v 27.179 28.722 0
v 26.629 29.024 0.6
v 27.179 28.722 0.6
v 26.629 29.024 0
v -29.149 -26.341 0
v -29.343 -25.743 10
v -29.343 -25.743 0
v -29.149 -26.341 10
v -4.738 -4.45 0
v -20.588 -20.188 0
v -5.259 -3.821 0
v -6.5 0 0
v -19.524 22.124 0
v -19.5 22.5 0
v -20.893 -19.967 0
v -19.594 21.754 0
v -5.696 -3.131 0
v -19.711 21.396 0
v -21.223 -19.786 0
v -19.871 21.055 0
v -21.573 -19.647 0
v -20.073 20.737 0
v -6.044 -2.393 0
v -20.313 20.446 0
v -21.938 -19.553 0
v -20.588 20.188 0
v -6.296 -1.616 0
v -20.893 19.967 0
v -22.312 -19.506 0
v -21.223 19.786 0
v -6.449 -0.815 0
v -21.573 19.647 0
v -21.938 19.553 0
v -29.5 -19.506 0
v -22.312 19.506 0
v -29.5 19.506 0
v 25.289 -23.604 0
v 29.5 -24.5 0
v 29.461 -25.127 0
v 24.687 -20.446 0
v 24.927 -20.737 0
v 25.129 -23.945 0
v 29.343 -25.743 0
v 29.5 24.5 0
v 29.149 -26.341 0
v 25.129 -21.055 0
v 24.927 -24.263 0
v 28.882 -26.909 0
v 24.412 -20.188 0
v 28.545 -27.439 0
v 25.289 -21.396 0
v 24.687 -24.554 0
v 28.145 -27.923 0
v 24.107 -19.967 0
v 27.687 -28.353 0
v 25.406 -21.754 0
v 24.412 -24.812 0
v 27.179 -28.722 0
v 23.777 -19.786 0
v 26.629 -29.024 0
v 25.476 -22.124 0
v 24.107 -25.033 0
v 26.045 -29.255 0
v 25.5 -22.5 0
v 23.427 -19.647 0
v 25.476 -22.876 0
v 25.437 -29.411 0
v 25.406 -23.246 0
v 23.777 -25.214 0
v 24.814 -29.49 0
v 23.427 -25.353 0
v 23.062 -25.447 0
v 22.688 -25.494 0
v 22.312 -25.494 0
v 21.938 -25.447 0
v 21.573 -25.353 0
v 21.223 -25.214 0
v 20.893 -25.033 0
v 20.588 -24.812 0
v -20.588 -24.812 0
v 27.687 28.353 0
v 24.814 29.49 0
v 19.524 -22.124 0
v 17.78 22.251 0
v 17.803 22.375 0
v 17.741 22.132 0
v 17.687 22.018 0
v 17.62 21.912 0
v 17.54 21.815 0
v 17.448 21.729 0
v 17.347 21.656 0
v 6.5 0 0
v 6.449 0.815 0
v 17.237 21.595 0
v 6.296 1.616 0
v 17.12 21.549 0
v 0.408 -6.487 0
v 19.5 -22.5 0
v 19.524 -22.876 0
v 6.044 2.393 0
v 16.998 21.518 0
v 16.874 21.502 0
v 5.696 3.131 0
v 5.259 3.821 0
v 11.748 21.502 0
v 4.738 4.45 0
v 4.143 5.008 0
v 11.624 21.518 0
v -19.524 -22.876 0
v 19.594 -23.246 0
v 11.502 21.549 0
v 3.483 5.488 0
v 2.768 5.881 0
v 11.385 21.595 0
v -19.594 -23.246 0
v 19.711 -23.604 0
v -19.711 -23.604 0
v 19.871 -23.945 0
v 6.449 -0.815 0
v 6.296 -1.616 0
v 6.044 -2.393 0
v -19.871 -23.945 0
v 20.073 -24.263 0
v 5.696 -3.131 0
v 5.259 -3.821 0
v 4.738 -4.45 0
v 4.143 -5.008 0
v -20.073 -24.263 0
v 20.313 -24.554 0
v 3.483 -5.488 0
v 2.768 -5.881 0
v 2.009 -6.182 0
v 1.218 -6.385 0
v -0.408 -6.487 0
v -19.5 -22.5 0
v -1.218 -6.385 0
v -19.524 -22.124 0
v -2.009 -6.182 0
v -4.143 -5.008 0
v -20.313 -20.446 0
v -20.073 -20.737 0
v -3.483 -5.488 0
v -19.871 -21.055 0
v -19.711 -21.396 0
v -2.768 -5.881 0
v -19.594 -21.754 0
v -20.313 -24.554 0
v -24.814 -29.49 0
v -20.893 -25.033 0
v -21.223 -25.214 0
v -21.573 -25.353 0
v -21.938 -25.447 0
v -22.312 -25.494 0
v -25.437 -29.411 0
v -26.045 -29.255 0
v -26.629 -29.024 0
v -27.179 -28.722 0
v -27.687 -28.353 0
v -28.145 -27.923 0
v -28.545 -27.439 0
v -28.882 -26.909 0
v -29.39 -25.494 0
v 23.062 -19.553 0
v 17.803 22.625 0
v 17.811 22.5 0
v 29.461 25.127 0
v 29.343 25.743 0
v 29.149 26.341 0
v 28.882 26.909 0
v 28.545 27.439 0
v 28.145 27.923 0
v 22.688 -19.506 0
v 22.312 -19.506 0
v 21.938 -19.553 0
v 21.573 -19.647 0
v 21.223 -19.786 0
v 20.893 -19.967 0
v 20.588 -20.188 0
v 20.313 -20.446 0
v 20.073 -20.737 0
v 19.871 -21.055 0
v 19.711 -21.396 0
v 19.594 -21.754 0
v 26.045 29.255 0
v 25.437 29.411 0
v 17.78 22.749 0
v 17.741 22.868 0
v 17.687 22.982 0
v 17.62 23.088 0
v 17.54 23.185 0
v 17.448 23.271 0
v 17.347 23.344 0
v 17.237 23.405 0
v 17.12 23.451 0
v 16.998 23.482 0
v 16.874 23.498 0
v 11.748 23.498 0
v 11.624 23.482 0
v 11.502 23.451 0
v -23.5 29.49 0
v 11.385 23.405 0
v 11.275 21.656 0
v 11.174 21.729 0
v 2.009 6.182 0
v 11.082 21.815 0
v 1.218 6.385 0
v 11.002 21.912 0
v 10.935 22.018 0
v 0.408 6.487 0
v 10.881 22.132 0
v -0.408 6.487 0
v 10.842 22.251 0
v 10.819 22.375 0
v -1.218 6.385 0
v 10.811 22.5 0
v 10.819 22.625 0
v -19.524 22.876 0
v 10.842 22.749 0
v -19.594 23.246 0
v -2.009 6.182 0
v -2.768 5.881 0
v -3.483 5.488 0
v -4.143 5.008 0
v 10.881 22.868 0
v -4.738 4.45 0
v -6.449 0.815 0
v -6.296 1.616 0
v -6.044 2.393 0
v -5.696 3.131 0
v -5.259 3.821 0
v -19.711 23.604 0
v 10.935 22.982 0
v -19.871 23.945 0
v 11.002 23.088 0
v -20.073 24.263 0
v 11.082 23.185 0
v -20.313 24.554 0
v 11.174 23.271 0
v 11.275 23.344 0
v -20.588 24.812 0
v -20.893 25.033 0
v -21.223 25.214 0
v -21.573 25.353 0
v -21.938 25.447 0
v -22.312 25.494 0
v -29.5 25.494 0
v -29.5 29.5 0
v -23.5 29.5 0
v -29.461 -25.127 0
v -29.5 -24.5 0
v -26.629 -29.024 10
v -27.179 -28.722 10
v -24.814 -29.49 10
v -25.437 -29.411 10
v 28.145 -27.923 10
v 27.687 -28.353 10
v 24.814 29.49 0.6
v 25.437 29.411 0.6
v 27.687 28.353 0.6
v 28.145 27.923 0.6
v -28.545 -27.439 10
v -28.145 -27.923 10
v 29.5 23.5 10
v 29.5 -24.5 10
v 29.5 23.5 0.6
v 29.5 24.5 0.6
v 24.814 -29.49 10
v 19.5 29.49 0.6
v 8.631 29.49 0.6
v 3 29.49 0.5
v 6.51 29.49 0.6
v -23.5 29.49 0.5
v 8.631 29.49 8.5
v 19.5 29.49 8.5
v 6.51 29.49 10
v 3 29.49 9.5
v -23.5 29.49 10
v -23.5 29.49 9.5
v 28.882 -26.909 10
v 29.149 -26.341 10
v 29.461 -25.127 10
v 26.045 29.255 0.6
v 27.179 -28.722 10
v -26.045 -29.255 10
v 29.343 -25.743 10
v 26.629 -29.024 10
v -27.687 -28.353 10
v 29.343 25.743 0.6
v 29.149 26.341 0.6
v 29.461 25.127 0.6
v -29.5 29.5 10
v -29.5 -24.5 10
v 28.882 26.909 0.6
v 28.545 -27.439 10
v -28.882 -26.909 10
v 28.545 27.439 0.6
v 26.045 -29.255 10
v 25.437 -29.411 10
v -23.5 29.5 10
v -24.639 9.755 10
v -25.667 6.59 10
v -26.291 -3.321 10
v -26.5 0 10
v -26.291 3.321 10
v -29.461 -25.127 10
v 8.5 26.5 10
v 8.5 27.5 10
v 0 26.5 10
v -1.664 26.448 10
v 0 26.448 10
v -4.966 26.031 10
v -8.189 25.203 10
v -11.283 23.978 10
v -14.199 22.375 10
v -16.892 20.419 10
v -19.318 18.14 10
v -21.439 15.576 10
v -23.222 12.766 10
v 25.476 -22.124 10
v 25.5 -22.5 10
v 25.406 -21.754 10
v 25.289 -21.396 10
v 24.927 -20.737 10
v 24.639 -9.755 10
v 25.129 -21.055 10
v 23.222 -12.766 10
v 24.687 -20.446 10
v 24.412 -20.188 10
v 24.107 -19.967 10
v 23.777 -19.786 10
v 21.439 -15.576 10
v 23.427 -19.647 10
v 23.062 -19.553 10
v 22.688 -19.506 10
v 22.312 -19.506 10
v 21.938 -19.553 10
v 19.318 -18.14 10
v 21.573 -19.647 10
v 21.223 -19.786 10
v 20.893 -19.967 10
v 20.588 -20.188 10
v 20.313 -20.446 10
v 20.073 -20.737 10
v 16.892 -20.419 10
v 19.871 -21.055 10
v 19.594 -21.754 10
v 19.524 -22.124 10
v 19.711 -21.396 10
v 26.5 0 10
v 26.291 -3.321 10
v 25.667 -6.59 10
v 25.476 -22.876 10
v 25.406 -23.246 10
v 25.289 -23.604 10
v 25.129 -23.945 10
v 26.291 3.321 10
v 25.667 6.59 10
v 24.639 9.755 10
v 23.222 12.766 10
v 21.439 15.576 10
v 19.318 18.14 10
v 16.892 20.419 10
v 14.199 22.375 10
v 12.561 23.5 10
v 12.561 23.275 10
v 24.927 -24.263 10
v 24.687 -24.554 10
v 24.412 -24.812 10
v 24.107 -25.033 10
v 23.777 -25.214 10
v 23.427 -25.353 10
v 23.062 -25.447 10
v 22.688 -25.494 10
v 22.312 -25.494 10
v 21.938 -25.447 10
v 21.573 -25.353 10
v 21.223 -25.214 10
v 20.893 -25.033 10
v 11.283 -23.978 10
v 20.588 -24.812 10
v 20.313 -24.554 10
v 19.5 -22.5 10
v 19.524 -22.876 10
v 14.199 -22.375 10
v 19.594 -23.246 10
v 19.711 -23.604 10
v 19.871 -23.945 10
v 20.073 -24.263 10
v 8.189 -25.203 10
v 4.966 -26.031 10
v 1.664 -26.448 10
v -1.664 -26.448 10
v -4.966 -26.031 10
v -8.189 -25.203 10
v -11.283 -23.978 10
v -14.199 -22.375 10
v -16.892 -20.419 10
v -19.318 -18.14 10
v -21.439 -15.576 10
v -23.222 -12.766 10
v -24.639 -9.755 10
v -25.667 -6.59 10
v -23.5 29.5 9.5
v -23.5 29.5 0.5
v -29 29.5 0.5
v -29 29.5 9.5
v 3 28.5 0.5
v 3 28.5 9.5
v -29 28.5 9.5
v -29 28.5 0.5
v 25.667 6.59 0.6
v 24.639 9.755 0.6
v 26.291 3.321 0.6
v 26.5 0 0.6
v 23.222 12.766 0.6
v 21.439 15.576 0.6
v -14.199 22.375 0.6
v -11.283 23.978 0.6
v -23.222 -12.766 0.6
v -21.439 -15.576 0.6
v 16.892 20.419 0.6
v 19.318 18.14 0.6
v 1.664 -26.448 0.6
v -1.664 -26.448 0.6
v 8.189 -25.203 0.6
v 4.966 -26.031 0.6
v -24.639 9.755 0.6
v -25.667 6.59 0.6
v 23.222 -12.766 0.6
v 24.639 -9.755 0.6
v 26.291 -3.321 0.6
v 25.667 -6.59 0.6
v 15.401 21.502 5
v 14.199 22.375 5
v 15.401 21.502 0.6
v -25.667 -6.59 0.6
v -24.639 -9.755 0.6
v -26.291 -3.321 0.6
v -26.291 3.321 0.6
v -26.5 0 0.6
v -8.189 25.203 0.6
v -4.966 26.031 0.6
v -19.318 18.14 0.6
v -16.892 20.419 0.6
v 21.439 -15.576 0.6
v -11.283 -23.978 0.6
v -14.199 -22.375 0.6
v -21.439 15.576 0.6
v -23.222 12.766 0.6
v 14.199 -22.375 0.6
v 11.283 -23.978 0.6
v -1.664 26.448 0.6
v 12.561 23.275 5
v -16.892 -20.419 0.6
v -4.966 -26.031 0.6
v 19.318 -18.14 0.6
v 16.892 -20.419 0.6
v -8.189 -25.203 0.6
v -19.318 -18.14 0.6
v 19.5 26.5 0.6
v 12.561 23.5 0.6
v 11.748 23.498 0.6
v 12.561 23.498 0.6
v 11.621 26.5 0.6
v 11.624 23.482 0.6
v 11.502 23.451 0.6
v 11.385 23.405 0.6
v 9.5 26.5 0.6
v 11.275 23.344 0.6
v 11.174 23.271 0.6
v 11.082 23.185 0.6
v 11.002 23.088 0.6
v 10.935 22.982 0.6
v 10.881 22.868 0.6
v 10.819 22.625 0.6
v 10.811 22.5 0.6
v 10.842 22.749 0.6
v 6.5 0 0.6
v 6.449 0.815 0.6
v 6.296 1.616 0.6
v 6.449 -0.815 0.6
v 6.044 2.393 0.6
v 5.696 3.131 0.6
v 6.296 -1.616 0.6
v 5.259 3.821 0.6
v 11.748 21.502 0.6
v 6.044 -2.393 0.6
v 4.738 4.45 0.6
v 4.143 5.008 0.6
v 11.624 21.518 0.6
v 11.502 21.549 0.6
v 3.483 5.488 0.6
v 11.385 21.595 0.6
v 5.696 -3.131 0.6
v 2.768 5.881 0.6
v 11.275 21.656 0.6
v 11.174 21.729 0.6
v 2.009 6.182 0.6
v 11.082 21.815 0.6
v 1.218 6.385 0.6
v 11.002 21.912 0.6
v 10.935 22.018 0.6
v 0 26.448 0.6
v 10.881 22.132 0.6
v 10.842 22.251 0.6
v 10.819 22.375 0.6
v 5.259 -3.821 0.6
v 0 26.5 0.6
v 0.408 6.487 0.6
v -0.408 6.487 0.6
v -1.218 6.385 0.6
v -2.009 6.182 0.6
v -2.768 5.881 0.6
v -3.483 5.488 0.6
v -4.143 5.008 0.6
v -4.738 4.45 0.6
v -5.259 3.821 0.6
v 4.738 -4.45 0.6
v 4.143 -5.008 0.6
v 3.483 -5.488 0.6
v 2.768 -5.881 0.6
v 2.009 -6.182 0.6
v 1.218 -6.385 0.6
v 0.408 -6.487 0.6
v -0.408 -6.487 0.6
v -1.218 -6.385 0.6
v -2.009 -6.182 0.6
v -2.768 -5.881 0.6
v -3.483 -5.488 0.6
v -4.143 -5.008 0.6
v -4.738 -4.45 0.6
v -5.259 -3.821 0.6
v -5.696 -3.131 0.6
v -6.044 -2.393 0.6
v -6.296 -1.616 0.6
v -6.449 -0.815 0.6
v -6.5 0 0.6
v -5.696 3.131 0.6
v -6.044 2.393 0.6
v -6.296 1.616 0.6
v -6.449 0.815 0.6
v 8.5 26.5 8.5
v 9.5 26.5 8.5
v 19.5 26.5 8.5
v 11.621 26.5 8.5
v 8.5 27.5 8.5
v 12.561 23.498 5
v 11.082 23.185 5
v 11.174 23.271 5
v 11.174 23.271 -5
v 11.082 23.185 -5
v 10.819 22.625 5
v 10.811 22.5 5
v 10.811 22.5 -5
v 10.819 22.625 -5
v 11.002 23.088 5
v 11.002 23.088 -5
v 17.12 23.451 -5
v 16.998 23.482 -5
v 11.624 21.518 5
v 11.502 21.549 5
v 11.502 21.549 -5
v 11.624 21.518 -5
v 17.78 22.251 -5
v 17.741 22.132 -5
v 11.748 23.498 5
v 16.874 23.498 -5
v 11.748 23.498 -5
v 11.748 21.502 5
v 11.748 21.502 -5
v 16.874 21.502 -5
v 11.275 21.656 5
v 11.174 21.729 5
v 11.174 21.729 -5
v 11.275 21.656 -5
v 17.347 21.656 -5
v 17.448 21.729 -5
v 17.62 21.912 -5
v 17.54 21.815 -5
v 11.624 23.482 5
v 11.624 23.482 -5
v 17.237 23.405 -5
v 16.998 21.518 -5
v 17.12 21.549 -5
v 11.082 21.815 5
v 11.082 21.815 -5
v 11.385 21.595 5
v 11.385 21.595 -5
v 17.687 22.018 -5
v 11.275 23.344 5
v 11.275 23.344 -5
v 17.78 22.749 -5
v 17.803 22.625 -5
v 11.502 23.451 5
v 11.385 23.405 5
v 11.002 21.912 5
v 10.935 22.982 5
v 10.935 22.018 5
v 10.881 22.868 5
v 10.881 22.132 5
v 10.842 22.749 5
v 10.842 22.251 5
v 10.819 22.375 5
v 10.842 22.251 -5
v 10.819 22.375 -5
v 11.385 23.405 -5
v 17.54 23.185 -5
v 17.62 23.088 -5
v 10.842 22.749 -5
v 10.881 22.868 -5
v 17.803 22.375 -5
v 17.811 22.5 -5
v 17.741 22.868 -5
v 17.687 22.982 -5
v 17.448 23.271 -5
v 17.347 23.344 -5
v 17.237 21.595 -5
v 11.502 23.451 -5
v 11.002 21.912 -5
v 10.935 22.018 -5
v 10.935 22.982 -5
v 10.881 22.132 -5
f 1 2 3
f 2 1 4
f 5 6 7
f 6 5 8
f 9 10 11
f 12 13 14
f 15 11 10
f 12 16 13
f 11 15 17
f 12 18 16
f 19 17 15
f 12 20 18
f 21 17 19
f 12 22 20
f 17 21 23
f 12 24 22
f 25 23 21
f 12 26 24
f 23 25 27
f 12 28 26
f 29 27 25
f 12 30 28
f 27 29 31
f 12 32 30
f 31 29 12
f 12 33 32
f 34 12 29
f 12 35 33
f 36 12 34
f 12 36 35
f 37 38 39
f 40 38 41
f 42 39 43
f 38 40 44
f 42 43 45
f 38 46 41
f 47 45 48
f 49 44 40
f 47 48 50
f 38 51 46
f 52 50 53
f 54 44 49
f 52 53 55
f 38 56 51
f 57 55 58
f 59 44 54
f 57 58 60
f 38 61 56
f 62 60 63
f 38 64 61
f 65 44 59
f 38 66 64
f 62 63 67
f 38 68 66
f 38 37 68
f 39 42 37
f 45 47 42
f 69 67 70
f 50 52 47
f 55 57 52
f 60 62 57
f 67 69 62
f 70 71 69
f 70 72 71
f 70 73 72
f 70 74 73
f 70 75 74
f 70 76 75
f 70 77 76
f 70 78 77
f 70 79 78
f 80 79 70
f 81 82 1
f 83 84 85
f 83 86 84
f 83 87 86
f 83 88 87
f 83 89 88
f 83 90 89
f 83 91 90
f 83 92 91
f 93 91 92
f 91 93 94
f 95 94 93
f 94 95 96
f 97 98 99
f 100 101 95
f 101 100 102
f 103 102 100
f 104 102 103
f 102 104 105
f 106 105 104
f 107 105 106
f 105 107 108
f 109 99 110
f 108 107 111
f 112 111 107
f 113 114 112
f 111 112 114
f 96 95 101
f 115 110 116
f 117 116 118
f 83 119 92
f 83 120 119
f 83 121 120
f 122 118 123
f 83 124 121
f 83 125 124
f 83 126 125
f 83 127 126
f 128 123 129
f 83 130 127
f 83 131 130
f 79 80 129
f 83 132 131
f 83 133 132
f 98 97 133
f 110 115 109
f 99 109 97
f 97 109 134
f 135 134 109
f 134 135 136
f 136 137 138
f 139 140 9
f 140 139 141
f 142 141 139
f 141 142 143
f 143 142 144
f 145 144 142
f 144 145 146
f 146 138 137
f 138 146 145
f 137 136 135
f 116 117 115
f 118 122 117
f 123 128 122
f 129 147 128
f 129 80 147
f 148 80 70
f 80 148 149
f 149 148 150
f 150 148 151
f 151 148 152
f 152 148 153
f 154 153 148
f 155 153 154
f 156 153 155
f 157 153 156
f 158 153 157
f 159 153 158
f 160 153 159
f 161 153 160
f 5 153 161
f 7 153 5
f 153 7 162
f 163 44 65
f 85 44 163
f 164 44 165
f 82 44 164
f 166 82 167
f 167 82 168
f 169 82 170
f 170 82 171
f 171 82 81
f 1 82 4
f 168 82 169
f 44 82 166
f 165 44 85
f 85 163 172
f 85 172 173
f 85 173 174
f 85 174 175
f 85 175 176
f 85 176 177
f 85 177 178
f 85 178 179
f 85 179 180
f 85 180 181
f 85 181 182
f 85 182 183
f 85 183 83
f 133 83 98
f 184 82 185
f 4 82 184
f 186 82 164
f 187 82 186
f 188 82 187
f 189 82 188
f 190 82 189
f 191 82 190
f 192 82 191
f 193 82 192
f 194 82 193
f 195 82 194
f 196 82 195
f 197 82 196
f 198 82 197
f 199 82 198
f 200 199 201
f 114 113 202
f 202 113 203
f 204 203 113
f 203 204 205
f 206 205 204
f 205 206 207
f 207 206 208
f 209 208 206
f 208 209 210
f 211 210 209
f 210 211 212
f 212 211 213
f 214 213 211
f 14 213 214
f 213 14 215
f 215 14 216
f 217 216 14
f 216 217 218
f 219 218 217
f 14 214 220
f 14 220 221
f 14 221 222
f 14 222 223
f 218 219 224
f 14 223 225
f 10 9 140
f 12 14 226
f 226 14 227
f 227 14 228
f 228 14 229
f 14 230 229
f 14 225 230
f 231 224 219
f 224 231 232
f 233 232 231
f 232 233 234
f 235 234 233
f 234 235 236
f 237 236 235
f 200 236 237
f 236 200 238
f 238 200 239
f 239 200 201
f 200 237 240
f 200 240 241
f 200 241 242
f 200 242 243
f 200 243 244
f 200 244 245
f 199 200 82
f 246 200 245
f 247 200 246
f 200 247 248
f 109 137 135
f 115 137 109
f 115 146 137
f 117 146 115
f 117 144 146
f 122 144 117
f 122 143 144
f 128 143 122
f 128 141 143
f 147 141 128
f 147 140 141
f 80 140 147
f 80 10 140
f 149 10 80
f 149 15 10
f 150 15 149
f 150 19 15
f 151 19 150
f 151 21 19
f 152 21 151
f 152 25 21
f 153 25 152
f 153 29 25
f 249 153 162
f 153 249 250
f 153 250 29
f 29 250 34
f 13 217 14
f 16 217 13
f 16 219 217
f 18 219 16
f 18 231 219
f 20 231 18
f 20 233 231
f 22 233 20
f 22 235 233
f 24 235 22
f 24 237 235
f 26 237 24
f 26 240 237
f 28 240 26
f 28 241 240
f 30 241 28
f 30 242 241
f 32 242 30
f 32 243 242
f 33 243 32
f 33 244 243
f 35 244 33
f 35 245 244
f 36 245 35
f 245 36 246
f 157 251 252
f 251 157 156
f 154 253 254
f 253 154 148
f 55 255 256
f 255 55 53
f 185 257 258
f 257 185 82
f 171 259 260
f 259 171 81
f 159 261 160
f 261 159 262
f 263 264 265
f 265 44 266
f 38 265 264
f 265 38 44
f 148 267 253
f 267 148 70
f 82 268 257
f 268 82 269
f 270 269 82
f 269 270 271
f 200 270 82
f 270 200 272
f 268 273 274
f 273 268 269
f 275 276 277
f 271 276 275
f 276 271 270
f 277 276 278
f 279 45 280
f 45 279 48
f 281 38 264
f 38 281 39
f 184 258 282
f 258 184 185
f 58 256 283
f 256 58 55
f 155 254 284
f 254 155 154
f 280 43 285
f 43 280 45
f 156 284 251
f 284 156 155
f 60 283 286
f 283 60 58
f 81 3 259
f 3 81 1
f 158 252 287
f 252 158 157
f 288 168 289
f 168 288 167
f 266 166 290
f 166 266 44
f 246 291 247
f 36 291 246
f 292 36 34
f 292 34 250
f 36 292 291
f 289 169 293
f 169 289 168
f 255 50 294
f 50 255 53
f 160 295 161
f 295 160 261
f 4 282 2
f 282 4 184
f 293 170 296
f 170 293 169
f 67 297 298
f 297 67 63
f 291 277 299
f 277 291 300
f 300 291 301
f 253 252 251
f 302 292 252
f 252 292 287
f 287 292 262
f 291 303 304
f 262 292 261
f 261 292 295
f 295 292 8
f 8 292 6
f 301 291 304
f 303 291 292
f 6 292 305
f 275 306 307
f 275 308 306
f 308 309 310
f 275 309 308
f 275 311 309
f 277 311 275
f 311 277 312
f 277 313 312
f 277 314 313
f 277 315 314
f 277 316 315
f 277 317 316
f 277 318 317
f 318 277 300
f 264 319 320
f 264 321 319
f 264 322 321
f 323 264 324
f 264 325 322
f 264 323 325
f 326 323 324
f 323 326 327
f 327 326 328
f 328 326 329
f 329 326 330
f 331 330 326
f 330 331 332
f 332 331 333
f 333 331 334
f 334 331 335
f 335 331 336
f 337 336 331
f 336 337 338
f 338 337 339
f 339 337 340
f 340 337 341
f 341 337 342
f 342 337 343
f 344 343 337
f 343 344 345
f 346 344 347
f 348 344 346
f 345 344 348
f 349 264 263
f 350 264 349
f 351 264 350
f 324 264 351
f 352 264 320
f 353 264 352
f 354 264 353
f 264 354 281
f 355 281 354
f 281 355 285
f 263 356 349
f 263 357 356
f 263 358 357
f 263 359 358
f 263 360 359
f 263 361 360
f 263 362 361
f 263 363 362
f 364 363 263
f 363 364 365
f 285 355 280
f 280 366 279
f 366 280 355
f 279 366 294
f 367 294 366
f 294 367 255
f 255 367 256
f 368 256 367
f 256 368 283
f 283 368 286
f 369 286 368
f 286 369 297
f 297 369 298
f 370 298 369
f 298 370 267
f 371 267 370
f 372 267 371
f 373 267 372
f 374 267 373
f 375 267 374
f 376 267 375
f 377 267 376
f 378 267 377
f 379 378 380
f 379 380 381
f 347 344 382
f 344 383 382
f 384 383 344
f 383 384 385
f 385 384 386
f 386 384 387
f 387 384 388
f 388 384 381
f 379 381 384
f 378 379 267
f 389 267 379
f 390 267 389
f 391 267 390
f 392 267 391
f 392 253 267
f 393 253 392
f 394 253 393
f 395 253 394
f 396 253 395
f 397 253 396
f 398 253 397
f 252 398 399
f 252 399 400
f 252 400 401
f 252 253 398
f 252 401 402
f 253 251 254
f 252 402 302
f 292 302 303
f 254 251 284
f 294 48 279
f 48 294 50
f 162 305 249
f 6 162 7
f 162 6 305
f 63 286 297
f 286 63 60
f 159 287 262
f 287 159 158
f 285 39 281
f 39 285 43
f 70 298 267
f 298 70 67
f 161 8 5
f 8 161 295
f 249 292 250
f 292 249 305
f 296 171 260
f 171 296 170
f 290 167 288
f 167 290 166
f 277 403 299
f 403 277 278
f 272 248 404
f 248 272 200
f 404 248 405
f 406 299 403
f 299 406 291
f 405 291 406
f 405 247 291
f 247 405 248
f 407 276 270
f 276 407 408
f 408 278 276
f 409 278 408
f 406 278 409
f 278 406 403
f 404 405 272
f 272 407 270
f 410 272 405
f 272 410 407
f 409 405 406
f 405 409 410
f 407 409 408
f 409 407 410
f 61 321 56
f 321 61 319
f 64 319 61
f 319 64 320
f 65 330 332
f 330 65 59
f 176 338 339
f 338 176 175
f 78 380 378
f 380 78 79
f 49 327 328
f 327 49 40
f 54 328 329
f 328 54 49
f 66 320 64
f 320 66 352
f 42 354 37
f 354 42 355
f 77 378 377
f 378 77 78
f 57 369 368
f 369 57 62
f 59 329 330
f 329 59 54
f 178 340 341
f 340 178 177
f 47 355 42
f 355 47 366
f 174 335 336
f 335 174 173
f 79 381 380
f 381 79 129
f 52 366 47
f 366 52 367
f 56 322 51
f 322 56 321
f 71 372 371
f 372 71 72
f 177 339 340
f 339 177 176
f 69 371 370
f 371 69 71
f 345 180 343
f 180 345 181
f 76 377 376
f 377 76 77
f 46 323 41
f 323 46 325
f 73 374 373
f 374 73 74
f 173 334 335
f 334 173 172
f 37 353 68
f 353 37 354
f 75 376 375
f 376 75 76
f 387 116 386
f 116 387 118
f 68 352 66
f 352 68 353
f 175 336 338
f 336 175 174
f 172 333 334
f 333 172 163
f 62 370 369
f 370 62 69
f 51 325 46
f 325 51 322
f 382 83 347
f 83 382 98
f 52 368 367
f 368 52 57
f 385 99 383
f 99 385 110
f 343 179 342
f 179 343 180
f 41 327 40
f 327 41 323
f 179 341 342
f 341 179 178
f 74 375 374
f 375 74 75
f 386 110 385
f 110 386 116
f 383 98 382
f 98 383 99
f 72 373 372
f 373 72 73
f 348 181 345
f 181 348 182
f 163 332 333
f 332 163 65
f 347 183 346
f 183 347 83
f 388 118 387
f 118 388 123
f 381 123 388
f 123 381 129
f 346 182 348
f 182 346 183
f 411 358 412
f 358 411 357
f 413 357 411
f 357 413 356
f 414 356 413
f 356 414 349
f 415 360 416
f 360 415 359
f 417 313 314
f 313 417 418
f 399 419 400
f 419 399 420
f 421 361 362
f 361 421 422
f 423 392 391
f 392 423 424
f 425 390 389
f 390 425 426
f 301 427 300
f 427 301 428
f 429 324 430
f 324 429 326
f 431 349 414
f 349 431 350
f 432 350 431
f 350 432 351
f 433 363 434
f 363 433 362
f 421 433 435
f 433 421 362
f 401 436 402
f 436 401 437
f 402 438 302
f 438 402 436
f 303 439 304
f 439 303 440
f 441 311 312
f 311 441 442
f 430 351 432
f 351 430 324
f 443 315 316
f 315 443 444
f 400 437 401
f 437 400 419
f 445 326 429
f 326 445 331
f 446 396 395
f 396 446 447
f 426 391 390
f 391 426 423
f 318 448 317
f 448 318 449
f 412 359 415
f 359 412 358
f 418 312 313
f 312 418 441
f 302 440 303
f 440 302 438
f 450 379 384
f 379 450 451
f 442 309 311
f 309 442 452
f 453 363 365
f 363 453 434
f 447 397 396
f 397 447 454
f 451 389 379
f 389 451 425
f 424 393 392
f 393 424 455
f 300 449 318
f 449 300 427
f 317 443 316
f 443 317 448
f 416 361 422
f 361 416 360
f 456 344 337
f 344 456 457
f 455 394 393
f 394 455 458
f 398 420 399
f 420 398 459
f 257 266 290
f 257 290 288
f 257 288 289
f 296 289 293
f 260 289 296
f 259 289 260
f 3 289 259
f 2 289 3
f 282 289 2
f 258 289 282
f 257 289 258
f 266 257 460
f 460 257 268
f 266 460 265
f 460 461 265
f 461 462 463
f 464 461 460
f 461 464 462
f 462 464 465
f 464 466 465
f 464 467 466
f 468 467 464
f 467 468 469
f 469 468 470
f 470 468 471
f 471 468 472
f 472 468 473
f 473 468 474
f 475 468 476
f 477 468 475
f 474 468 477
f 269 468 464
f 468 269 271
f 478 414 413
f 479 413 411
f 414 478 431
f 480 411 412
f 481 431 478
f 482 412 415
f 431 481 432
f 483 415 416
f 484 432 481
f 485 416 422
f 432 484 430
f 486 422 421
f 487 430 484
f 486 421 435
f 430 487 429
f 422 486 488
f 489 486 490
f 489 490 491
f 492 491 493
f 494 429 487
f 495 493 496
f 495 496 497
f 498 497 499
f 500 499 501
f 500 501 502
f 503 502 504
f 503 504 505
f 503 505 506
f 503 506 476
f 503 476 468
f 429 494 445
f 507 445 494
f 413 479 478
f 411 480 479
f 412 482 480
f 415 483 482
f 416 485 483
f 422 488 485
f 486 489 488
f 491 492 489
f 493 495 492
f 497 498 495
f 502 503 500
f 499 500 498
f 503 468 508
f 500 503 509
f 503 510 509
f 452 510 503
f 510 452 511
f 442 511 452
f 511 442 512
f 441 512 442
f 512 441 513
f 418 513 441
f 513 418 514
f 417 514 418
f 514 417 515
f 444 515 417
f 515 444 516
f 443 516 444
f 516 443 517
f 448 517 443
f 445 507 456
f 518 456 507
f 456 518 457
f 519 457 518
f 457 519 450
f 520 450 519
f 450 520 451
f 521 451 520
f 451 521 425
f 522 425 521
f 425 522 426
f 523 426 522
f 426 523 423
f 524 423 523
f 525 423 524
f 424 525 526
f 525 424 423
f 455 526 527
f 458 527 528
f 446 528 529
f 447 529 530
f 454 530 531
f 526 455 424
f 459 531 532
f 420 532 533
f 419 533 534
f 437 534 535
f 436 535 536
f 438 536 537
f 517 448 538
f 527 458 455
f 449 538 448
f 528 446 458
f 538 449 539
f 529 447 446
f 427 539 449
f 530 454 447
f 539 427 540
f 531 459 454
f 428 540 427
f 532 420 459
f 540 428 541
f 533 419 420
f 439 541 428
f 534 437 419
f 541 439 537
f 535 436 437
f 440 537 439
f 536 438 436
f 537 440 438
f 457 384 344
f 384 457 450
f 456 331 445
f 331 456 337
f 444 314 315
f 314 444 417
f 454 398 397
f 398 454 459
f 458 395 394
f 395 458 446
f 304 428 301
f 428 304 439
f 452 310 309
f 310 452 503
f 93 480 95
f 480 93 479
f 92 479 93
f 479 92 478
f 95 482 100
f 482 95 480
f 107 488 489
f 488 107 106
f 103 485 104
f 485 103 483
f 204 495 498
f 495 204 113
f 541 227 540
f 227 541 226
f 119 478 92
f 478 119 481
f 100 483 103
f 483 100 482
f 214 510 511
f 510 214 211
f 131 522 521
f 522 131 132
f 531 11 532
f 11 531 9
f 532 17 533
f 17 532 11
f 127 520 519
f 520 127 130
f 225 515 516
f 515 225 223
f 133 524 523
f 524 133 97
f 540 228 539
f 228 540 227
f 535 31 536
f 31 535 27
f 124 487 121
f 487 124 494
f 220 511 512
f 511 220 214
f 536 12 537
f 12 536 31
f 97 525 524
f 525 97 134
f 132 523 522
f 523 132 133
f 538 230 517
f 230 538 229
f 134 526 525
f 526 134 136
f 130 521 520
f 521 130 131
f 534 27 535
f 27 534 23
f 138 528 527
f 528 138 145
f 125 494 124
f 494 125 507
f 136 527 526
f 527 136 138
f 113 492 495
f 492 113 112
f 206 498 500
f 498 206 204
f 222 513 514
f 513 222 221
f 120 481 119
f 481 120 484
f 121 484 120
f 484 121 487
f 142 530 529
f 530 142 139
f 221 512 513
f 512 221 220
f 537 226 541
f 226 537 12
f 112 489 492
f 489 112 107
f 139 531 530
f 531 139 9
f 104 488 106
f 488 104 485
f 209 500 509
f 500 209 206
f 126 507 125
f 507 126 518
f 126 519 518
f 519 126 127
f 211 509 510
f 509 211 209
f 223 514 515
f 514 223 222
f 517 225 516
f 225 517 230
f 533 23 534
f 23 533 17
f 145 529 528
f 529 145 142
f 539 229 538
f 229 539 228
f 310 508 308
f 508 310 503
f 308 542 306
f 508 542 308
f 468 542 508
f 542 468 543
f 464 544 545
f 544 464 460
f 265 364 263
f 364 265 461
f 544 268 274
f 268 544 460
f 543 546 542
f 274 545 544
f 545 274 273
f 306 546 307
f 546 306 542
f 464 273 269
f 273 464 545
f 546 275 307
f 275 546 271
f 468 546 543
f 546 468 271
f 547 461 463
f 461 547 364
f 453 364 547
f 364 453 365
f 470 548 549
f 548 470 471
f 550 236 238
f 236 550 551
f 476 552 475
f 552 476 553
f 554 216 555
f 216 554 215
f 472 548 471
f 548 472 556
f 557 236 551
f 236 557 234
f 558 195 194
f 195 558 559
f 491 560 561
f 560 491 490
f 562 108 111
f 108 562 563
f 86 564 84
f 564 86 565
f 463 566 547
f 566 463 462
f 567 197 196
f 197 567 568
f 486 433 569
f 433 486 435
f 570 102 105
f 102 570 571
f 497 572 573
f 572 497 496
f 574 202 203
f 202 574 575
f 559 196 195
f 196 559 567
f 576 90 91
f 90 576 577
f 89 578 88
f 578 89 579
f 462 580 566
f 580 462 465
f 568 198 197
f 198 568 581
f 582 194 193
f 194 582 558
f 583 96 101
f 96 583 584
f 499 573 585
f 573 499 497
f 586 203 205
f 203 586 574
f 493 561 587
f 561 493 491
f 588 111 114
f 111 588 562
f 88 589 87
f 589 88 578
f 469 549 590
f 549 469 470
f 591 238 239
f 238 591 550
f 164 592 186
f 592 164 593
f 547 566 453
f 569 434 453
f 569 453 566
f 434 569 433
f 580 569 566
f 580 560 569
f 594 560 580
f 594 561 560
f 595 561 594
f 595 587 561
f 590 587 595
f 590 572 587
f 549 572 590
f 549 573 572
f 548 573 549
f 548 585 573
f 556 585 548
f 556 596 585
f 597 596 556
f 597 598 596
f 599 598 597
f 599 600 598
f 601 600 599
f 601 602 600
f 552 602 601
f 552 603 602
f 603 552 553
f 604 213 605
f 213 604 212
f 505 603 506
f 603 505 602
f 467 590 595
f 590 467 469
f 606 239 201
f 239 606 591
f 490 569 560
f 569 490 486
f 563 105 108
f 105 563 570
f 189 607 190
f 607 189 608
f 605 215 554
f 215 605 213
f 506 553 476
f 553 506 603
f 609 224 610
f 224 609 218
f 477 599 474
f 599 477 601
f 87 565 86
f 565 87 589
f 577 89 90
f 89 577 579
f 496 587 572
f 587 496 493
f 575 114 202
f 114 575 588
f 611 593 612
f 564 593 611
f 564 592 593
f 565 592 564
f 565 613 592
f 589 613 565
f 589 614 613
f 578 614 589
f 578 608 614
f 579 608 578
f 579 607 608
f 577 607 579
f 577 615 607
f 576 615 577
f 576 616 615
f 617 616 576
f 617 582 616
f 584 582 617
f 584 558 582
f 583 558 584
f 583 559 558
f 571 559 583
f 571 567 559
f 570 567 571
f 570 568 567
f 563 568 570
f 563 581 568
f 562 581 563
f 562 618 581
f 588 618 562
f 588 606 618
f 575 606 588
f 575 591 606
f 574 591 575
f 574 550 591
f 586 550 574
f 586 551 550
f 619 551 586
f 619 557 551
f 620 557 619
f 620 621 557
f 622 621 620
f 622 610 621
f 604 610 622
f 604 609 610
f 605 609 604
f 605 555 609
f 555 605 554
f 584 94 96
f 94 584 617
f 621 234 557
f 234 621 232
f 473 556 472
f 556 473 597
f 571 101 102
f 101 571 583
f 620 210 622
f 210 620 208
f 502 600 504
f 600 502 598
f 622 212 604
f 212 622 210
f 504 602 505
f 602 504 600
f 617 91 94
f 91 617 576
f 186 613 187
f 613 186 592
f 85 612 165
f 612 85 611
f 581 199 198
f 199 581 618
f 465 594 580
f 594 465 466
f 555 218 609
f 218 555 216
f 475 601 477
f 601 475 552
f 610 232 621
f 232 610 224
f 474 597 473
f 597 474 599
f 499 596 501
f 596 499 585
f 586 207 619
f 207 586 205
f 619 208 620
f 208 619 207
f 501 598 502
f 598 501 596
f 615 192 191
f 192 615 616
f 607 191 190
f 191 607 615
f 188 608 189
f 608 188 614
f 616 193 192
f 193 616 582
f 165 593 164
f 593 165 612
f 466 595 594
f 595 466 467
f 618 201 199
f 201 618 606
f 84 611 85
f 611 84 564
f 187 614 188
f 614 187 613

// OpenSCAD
$fn = 50;


union() {
	difference() {
		union() {
			hull() {
				translate(v = [-24.5000000000, 24.5000000000, 0]) {
					cylinder(h = 10, r = 5);
				}
				translate(v = [24.5000000000, 24.5000000000, 0]) {
					cylinder(h = 10, r = 5);
				}
				translate(v = [-24.5000000000, -24.5000000000, 0]) {
					cylinder(h = 10, r = 5);
				}
				translate(v = [24.5000000000, -24.5000000000, 0]) {
					cylinder(h = 10, r = 5);
				}
			}
			translate(v = [-29.5000000000, 23.5000000000, 0]) {
				cube(size = [6, 6, 10]);
			}
		}
		union() {
			translate(v = [-30.0000000000, -22.5000000000, -250.0000000000]) {
				rotate(a = [0, 0, 0]) {
					difference() {
						union() {
							hull() {
								translate(v = [7.5000000000, 0, 0]) {
									cylinder(h = 250, r = 3.0000000000, r1 = 3.0000000000, r2 = 3.0000000000);
								}
								translate(v = [-7.5000000000, 0, 0]) {
									cylinder(h = 250, r = 3.0000000000, r1 = 3.0000000000, r2 = 3.0000000000);
								}
							}
						}
						union();
					}
				}
			}
			translate(v = [-30.0000000000, 22.5000000000, -250.0000000000]) {
				rotate(a = [0, 0, 0]) {
					difference() {
						union() {
							hull() {
								translate(v = [7.5000000000, 0, 0]) {
									cylinder(h = 250, r = 3.0000000000, r1 = 3.0000000000, r2 = 3.0000000000);
								}
								translate(v = [-7.5000000000, 0, 0]) {
									cylinder(h = 250, r = 3.0000000000, r1 = 3.0000000000, r2 = 3.0000000000);
								}
							}
						}
						union();
					}
				}
			}
			translate(v = [-29.0000000000, 28.5000000000, 0.5000000000]) {
				cube(size = [32, 1, 9.0000000000]);
			}
			translate(v = [22.5000000000, -22.5000000000, 0]) {
				cylinder(h = 100, r = 3.0000000000);
			}
			translate(v = [0, 0, 0.6000000000]) {
				cylinder(h = 12.4000000000, r = 26.5000000000);
			}
			translate(v = [0, 0, -5.0000000000]) {
				cylinder(h = 10, r = 6.5000000000);
			}
			translate(v = [0.0000000000, 23.5000000000, 0.6000000000]) {
				cube(size = [29.5000000000, 3, 12.4000000000]);
			}
			translate(v = [19.5000000000, 23.5000000000, 0.6000000000]) {
				cube(size = [10, 6, 12.4000000000]);
			}
			translate(v = [8.5000000000, 23.5000000000, 8.5000000000]) {
				cube(size = [21, 6, 1.5000000000]);
			}
			translate(v = [5.7500000000, 30.2500000000, 0.6000000000]) {
				rotate(a = [0, 0, -45]) {
					cube(size = [7.5000000000, 1.5000000000, 12.4000000000]);
				}
			}
			translate(v = [5.0610000000, 21.5000000000, 0.6000000000]) {
				cube(size = [7.5000000000, 2, 9.4000000000]);
			}
		}
	}
	union() {
		translate(v = [14.3110000000, 22.5000000000, -5.0000000000]) {
			rotate(a = [0, 0, 0]) {
				difference() {
					union() {
						#hull() {
							#translate(v = [2.5000000000, 0, 0]) {
								cylinder(h = 10, r = 1.0000000000, r1 = 1.0000000000, r2 = 1.0000000000);
							}
							#translate(v = [-2.5000000000, 0, 0]) {
								cylinder(h = 10, r = 1.0000000000, r1 = 1.0000000000, r2 = 1.0000000000);
							}
						}
					}
					union();
				}
			}
		}
	}
}
